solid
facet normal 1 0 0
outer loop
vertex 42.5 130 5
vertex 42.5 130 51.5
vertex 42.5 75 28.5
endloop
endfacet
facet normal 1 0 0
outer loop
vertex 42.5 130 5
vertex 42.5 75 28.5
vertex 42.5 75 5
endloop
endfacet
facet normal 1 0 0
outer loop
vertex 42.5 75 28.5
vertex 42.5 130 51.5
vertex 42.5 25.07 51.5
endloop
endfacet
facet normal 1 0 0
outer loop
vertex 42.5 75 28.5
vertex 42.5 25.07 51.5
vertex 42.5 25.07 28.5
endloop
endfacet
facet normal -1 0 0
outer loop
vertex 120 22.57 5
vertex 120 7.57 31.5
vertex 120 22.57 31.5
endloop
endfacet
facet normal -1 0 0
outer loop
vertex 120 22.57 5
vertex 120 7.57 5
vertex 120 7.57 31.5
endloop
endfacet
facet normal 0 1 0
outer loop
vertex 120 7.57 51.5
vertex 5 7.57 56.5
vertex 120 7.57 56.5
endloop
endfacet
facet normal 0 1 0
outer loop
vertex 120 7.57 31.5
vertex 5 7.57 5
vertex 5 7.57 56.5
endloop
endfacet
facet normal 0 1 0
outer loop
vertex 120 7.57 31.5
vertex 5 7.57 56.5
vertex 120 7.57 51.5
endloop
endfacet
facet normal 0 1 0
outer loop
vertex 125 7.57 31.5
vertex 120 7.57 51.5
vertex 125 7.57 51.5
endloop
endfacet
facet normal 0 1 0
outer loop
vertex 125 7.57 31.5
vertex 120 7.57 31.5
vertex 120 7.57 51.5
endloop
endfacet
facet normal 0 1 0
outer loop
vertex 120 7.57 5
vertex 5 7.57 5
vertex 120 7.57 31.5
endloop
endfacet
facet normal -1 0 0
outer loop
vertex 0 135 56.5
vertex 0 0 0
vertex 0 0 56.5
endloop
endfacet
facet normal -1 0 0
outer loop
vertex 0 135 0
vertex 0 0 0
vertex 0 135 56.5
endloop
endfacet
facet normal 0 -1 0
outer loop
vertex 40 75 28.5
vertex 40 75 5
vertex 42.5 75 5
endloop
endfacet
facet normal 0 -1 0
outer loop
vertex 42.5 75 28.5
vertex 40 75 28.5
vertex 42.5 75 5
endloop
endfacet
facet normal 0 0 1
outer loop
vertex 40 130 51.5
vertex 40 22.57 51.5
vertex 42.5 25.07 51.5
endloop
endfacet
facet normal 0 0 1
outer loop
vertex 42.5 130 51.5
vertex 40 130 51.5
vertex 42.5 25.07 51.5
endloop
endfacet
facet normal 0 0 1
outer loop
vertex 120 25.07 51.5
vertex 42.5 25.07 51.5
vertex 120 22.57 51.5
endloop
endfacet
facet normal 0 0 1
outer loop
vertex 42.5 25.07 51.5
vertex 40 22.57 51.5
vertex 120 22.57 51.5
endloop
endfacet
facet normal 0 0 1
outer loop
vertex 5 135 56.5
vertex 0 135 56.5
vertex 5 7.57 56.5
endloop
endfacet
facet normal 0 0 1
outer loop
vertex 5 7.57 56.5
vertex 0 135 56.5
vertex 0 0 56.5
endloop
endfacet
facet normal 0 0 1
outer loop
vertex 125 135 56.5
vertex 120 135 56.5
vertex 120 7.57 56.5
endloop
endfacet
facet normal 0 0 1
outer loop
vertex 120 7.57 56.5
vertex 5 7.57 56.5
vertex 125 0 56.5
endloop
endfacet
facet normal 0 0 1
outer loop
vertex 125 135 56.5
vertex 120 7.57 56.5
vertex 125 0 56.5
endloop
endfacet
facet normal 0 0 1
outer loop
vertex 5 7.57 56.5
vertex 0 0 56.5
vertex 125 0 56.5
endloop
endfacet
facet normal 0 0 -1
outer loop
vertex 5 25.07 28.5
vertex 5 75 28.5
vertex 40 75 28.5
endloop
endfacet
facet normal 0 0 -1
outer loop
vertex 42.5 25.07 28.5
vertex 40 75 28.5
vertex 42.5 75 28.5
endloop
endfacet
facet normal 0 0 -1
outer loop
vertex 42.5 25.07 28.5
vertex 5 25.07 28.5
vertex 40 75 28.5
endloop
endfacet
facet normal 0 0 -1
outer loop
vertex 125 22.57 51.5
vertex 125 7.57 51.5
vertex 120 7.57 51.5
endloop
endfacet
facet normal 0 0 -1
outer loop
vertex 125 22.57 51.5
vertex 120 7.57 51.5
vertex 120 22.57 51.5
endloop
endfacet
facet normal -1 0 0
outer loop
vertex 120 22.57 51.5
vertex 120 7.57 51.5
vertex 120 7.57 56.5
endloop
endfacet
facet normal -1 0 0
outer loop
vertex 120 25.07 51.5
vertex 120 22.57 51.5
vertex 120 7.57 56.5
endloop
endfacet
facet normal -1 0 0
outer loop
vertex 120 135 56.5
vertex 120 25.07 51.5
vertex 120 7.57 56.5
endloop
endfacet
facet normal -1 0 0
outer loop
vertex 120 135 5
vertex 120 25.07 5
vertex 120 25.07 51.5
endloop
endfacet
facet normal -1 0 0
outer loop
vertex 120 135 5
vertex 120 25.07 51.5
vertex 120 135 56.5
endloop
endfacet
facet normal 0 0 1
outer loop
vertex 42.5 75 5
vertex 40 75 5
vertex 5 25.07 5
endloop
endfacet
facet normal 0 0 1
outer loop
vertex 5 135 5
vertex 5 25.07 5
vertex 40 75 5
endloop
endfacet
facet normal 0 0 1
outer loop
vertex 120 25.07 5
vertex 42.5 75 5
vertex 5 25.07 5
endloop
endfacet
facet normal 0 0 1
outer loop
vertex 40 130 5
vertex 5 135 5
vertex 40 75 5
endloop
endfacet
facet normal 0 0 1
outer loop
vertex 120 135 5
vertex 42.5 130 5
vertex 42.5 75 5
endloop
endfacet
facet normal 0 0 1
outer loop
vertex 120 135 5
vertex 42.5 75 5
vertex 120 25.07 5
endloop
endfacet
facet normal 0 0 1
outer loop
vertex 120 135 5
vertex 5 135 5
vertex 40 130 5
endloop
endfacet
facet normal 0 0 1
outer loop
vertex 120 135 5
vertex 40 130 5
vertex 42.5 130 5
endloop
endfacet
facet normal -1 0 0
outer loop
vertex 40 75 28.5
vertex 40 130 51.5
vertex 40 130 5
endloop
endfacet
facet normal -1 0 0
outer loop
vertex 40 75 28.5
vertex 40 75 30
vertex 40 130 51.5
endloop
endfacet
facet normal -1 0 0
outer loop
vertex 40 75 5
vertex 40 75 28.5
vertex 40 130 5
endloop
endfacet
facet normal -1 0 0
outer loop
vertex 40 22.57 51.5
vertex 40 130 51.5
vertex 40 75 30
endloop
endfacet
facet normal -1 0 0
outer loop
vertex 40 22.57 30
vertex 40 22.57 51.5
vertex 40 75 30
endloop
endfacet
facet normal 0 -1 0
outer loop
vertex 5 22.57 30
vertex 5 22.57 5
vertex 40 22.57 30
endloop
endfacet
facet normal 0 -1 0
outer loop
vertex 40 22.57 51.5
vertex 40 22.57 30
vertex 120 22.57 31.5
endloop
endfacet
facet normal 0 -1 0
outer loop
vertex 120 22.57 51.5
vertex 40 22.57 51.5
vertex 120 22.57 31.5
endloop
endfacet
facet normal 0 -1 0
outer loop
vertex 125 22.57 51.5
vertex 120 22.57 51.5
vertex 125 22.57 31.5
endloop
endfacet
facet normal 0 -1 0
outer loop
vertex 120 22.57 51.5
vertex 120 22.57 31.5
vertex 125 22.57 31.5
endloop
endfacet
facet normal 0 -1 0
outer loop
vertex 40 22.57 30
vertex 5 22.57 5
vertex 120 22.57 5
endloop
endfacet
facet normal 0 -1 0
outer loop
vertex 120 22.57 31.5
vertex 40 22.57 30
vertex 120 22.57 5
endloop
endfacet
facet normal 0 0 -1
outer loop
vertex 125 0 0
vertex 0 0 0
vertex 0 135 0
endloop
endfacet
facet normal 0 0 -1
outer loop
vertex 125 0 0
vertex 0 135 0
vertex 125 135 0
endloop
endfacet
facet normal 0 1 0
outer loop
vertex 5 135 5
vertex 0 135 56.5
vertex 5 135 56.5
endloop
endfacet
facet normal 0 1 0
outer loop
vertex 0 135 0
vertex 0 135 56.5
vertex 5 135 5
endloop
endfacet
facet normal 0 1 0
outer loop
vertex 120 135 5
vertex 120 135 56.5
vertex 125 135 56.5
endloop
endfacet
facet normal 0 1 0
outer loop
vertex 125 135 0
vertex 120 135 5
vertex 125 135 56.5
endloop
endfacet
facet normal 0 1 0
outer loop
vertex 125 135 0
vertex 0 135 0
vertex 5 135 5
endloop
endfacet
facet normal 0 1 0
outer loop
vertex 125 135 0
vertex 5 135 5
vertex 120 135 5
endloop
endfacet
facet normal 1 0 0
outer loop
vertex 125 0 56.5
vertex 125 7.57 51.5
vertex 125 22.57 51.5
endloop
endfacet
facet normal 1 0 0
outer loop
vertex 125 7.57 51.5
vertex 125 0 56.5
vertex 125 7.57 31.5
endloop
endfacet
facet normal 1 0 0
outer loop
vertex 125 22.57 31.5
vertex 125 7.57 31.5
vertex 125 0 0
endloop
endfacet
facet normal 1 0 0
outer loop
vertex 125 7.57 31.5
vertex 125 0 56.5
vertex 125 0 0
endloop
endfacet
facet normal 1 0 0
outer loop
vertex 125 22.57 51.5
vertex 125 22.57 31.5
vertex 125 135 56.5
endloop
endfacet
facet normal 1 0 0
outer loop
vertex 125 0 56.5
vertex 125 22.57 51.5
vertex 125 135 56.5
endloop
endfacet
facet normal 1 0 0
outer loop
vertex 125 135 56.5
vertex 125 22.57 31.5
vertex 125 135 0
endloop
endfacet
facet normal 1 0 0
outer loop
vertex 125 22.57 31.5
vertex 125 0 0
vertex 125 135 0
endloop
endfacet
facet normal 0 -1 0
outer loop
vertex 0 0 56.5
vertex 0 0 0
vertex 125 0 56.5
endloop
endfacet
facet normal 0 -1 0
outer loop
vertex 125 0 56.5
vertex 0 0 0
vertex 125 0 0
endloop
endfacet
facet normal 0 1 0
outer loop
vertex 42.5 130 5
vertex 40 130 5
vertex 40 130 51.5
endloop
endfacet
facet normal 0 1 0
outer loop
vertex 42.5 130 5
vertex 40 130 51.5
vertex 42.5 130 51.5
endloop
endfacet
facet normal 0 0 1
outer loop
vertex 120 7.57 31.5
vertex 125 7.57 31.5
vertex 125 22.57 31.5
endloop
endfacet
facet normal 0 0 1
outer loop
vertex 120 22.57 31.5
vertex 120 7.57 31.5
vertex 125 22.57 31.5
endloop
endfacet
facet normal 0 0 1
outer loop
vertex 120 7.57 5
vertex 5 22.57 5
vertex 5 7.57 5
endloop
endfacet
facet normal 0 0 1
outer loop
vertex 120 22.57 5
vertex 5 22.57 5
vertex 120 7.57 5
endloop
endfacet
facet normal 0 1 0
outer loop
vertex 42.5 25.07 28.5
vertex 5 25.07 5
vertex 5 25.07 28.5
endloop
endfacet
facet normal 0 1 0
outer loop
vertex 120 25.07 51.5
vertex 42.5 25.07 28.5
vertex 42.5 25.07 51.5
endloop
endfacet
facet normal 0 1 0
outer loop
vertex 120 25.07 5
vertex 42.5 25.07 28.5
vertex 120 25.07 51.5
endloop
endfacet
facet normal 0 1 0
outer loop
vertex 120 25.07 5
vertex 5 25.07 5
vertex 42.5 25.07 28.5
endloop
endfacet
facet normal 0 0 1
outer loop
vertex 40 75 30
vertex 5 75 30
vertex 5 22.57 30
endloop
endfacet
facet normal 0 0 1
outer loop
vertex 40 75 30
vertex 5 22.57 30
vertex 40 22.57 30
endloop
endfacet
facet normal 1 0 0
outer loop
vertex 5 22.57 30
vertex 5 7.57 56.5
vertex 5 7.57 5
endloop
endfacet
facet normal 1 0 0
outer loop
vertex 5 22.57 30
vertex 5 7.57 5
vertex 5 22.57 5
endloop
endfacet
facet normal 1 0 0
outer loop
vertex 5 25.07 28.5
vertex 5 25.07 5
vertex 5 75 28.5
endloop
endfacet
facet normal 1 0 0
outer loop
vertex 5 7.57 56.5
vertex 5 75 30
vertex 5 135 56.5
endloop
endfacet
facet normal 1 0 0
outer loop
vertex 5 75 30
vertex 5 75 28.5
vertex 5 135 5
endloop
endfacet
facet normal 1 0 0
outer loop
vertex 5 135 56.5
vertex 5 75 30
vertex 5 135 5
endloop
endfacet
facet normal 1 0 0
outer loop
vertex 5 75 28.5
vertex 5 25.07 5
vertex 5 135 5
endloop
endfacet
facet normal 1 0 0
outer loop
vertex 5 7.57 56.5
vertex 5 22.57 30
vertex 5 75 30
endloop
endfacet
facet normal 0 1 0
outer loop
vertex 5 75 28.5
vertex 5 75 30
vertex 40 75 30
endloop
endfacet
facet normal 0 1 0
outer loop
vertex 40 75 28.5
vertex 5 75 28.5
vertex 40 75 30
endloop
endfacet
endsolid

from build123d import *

# Parameters (mm, degrees)
SKETCH1_W            = 125
SKETCH1_H            = 135
BOSS_EXTRUDE1_DEPTH  = 5
SKETCH2_W            = 5
SKETCH2_H            = 135
BOSS_EXTRUDE2_DEPTH  = 51.5
SKETCH3_W            = 5
SKETCH3_H            = 135
BOSS_EXTRUDE3_DEPTH  = 51.5
SKETCH5_W            = 115
SKETCH5_H            = 7.57
BOSS_EXTRUDE4_DEPTH  = 51.5
SKETCH21_W           = 2.5
SKETCH21_H           = 55
BOSS_EXTRUDE13_DEPTH = 46.5
SKETCH23_W           = 115
SKETCH23_H           = 2.5
BOSS_EXTRUDE14_DEPTH = 25
BOSS_EXTRUDE15_REACH = 177.789
SKETCH24_W           = 35
SKETCH24_H           = 1.5
SKETCH25_W           = 80
SKETCH25_H           = 2.5
BOSS_EXTRUDE16_DEPTH = 26.5
SKETCH27_W           = 2.5
SKETCH27_H           = 28
BOSS_EXTRUDE20_DEPTH = 104.93
CUT_EXTRUDE1_REACH   = 188.414
SKETCH28_W           = 35
SKETCH28_H           = 55
SKETCH29_W           = 80
SKETCH29_H           = 5
CUT_EXTRUDE2_DEPTH   = 178.363341477
SKETCH35_W           = 20
SKETCH35_H           = 15
CUT_EXTRUDE5_DEPTH   = 7.5


with BuildPart() as part:
    # Sketch1 → Boss-Extrude1 (new body)
    with BuildSketch(Plane.XY):
        with Locations((62.5, 67.5)):
            Rectangle(SKETCH1_W, SKETCH1_H)
    extrude(amount=BOSS_EXTRUDE1_DEPTH)

    # Sketch2 → Boss-Extrude2 (add)
    with BuildSketch(Plane.XY.offset(5)):
        with Locations((2.5, 67.5)):
            Rectangle(SKETCH2_W, SKETCH2_H)
    extrude(amount=BOSS_EXTRUDE2_DEPTH)

    # Sketch3 → Boss-Extrude3 (add)
    with BuildSketch(Plane.XY.offset(5)):
        with Locations((122.5, 67.5)):
            Rectangle(SKETCH3_W, SKETCH3_H)
    extrude(amount=BOSS_EXTRUDE3_DEPTH)

    # Sketch5 → Boss-Extrude4 (add)
    with BuildSketch(Plane.XY.offset(5)):
        with Locations((62.5, 3.785)):
            Rectangle(SKETCH5_W, SKETCH5_H)
    extrude(amount=BOSS_EXTRUDE4_DEPTH)

    # Sketch21 → Boss-Extrude13 (add)
    with BuildSketch(Plane.XY.offset(5)):
        with Locations((41.25, 102.5)):
            Rectangle(SKETCH21_W, SKETCH21_H)
    extrude(amount=BOSS_EXTRUDE13_DEPTH)

    # Sketch23 → Boss-Extrude14 (add)
    with BuildSketch(Plane.XY.offset(5)):
        with Locations((62.5, 23.82)):
            Rectangle(SKETCH23_W, SKETCH23_H)
    extrude(amount=BOSS_EXTRUDE14_DEPTH)

    # Boss-Extrude15: up to this face of the body (flat: up to its plane)
    boss_extrude15_end = Plane(part.part.faces().sort_by_distance((41.25, 130, 28.25))[0])
    # Sketch24 → Boss-Extrude15 (add, up to the picked face)
    with BuildSketch(Plane(origin=(0, 25.07, 0), x_dir=(1, 0, 0), z_dir=(0, 1, 0)), mode=Mode.PRIVATE) as boss_extrude15_sk1:
        with Locations((22.5, -29.25)):
            Rectangle(SKETCH24_W, SKETCH24_H)
    boss_extrude15_tool1 = split(extrude(boss_extrude15_sk1.sketch, amount=BOSS_EXTRUDE15_REACH, mode=Mode.PRIVATE), bisect_by=boss_extrude15_end, keep=Keep.BOTH, mode=Mode.PRIVATE)
    add(boss_extrude15_tool1.solids().sort_by(Axis((22.5, 25.07, 29.25), (0, 1, 0)))[0])

    # Sketch25 → Boss-Extrude16 (add)
    with BuildSketch(Plane.XY.offset(30)):
        with Locations((80, 23.82)):
            Rectangle(SKETCH25_W, SKETCH25_H)
    extrude(amount=BOSS_EXTRUDE16_DEPTH)

    # Sketch27 → Boss-Extrude20 (add)
    with BuildSketch(Plane(origin=(0, 25.07, 0), x_dir=(1, 0, 0), z_dir=(0, 1, 0))):
        with Locations((41.25, -42.5)):
            Rectangle(SKETCH27_W, SKETCH27_H)
    extrude(amount=BOSS_EXTRUDE20_DEPTH)

    # Sketch28 → Cut-Extrude1 (cut, up to next)
    with BuildSketch(Plane.XY.offset(30), mode=Mode.PRIVATE) as cut_extrude1_sk1:
        with Locations((22.5, 102.5)):
            Rectangle(SKETCH28_W, SKETCH28_H)
    cut_extrude1_tool1 = extrude(cut_extrude1_sk1.sketch, amount=-CUT_EXTRUDE1_REACH, mode=Mode.PRIVATE) & part.part
    add(cut_extrude1_tool1.solids().sort_by_distance((22.5, 102.5, 30))[0], mode=Mode.SUBTRACT)

    # Sketch29 → Cut-Extrude2 (cut, through all)
    with BuildSketch(Plane.XZ.offset(-22.57)):
        with Locations((80, 54)):
            Rectangle(SKETCH29_W, SKETCH29_H)
    extrude(amount=-CUT_EXTRUDE2_DEPTH, mode=Mode.SUBTRACT)

    # Sketch35 → Cut-Extrude5 (cut)
    with BuildSketch(Plane(origin=(125, 0, 0), x_dir=(0, 0, -1), z_dir=(1, 0, 0))):
        with Locations((-41.5, 15.07)):
            Rectangle(SKETCH35_W, SKETCH35_H)
    extrude(amount=-CUT_EXTRUDE5_DEPTH, mode=Mode.SUBTRACT)


solid = part.part
